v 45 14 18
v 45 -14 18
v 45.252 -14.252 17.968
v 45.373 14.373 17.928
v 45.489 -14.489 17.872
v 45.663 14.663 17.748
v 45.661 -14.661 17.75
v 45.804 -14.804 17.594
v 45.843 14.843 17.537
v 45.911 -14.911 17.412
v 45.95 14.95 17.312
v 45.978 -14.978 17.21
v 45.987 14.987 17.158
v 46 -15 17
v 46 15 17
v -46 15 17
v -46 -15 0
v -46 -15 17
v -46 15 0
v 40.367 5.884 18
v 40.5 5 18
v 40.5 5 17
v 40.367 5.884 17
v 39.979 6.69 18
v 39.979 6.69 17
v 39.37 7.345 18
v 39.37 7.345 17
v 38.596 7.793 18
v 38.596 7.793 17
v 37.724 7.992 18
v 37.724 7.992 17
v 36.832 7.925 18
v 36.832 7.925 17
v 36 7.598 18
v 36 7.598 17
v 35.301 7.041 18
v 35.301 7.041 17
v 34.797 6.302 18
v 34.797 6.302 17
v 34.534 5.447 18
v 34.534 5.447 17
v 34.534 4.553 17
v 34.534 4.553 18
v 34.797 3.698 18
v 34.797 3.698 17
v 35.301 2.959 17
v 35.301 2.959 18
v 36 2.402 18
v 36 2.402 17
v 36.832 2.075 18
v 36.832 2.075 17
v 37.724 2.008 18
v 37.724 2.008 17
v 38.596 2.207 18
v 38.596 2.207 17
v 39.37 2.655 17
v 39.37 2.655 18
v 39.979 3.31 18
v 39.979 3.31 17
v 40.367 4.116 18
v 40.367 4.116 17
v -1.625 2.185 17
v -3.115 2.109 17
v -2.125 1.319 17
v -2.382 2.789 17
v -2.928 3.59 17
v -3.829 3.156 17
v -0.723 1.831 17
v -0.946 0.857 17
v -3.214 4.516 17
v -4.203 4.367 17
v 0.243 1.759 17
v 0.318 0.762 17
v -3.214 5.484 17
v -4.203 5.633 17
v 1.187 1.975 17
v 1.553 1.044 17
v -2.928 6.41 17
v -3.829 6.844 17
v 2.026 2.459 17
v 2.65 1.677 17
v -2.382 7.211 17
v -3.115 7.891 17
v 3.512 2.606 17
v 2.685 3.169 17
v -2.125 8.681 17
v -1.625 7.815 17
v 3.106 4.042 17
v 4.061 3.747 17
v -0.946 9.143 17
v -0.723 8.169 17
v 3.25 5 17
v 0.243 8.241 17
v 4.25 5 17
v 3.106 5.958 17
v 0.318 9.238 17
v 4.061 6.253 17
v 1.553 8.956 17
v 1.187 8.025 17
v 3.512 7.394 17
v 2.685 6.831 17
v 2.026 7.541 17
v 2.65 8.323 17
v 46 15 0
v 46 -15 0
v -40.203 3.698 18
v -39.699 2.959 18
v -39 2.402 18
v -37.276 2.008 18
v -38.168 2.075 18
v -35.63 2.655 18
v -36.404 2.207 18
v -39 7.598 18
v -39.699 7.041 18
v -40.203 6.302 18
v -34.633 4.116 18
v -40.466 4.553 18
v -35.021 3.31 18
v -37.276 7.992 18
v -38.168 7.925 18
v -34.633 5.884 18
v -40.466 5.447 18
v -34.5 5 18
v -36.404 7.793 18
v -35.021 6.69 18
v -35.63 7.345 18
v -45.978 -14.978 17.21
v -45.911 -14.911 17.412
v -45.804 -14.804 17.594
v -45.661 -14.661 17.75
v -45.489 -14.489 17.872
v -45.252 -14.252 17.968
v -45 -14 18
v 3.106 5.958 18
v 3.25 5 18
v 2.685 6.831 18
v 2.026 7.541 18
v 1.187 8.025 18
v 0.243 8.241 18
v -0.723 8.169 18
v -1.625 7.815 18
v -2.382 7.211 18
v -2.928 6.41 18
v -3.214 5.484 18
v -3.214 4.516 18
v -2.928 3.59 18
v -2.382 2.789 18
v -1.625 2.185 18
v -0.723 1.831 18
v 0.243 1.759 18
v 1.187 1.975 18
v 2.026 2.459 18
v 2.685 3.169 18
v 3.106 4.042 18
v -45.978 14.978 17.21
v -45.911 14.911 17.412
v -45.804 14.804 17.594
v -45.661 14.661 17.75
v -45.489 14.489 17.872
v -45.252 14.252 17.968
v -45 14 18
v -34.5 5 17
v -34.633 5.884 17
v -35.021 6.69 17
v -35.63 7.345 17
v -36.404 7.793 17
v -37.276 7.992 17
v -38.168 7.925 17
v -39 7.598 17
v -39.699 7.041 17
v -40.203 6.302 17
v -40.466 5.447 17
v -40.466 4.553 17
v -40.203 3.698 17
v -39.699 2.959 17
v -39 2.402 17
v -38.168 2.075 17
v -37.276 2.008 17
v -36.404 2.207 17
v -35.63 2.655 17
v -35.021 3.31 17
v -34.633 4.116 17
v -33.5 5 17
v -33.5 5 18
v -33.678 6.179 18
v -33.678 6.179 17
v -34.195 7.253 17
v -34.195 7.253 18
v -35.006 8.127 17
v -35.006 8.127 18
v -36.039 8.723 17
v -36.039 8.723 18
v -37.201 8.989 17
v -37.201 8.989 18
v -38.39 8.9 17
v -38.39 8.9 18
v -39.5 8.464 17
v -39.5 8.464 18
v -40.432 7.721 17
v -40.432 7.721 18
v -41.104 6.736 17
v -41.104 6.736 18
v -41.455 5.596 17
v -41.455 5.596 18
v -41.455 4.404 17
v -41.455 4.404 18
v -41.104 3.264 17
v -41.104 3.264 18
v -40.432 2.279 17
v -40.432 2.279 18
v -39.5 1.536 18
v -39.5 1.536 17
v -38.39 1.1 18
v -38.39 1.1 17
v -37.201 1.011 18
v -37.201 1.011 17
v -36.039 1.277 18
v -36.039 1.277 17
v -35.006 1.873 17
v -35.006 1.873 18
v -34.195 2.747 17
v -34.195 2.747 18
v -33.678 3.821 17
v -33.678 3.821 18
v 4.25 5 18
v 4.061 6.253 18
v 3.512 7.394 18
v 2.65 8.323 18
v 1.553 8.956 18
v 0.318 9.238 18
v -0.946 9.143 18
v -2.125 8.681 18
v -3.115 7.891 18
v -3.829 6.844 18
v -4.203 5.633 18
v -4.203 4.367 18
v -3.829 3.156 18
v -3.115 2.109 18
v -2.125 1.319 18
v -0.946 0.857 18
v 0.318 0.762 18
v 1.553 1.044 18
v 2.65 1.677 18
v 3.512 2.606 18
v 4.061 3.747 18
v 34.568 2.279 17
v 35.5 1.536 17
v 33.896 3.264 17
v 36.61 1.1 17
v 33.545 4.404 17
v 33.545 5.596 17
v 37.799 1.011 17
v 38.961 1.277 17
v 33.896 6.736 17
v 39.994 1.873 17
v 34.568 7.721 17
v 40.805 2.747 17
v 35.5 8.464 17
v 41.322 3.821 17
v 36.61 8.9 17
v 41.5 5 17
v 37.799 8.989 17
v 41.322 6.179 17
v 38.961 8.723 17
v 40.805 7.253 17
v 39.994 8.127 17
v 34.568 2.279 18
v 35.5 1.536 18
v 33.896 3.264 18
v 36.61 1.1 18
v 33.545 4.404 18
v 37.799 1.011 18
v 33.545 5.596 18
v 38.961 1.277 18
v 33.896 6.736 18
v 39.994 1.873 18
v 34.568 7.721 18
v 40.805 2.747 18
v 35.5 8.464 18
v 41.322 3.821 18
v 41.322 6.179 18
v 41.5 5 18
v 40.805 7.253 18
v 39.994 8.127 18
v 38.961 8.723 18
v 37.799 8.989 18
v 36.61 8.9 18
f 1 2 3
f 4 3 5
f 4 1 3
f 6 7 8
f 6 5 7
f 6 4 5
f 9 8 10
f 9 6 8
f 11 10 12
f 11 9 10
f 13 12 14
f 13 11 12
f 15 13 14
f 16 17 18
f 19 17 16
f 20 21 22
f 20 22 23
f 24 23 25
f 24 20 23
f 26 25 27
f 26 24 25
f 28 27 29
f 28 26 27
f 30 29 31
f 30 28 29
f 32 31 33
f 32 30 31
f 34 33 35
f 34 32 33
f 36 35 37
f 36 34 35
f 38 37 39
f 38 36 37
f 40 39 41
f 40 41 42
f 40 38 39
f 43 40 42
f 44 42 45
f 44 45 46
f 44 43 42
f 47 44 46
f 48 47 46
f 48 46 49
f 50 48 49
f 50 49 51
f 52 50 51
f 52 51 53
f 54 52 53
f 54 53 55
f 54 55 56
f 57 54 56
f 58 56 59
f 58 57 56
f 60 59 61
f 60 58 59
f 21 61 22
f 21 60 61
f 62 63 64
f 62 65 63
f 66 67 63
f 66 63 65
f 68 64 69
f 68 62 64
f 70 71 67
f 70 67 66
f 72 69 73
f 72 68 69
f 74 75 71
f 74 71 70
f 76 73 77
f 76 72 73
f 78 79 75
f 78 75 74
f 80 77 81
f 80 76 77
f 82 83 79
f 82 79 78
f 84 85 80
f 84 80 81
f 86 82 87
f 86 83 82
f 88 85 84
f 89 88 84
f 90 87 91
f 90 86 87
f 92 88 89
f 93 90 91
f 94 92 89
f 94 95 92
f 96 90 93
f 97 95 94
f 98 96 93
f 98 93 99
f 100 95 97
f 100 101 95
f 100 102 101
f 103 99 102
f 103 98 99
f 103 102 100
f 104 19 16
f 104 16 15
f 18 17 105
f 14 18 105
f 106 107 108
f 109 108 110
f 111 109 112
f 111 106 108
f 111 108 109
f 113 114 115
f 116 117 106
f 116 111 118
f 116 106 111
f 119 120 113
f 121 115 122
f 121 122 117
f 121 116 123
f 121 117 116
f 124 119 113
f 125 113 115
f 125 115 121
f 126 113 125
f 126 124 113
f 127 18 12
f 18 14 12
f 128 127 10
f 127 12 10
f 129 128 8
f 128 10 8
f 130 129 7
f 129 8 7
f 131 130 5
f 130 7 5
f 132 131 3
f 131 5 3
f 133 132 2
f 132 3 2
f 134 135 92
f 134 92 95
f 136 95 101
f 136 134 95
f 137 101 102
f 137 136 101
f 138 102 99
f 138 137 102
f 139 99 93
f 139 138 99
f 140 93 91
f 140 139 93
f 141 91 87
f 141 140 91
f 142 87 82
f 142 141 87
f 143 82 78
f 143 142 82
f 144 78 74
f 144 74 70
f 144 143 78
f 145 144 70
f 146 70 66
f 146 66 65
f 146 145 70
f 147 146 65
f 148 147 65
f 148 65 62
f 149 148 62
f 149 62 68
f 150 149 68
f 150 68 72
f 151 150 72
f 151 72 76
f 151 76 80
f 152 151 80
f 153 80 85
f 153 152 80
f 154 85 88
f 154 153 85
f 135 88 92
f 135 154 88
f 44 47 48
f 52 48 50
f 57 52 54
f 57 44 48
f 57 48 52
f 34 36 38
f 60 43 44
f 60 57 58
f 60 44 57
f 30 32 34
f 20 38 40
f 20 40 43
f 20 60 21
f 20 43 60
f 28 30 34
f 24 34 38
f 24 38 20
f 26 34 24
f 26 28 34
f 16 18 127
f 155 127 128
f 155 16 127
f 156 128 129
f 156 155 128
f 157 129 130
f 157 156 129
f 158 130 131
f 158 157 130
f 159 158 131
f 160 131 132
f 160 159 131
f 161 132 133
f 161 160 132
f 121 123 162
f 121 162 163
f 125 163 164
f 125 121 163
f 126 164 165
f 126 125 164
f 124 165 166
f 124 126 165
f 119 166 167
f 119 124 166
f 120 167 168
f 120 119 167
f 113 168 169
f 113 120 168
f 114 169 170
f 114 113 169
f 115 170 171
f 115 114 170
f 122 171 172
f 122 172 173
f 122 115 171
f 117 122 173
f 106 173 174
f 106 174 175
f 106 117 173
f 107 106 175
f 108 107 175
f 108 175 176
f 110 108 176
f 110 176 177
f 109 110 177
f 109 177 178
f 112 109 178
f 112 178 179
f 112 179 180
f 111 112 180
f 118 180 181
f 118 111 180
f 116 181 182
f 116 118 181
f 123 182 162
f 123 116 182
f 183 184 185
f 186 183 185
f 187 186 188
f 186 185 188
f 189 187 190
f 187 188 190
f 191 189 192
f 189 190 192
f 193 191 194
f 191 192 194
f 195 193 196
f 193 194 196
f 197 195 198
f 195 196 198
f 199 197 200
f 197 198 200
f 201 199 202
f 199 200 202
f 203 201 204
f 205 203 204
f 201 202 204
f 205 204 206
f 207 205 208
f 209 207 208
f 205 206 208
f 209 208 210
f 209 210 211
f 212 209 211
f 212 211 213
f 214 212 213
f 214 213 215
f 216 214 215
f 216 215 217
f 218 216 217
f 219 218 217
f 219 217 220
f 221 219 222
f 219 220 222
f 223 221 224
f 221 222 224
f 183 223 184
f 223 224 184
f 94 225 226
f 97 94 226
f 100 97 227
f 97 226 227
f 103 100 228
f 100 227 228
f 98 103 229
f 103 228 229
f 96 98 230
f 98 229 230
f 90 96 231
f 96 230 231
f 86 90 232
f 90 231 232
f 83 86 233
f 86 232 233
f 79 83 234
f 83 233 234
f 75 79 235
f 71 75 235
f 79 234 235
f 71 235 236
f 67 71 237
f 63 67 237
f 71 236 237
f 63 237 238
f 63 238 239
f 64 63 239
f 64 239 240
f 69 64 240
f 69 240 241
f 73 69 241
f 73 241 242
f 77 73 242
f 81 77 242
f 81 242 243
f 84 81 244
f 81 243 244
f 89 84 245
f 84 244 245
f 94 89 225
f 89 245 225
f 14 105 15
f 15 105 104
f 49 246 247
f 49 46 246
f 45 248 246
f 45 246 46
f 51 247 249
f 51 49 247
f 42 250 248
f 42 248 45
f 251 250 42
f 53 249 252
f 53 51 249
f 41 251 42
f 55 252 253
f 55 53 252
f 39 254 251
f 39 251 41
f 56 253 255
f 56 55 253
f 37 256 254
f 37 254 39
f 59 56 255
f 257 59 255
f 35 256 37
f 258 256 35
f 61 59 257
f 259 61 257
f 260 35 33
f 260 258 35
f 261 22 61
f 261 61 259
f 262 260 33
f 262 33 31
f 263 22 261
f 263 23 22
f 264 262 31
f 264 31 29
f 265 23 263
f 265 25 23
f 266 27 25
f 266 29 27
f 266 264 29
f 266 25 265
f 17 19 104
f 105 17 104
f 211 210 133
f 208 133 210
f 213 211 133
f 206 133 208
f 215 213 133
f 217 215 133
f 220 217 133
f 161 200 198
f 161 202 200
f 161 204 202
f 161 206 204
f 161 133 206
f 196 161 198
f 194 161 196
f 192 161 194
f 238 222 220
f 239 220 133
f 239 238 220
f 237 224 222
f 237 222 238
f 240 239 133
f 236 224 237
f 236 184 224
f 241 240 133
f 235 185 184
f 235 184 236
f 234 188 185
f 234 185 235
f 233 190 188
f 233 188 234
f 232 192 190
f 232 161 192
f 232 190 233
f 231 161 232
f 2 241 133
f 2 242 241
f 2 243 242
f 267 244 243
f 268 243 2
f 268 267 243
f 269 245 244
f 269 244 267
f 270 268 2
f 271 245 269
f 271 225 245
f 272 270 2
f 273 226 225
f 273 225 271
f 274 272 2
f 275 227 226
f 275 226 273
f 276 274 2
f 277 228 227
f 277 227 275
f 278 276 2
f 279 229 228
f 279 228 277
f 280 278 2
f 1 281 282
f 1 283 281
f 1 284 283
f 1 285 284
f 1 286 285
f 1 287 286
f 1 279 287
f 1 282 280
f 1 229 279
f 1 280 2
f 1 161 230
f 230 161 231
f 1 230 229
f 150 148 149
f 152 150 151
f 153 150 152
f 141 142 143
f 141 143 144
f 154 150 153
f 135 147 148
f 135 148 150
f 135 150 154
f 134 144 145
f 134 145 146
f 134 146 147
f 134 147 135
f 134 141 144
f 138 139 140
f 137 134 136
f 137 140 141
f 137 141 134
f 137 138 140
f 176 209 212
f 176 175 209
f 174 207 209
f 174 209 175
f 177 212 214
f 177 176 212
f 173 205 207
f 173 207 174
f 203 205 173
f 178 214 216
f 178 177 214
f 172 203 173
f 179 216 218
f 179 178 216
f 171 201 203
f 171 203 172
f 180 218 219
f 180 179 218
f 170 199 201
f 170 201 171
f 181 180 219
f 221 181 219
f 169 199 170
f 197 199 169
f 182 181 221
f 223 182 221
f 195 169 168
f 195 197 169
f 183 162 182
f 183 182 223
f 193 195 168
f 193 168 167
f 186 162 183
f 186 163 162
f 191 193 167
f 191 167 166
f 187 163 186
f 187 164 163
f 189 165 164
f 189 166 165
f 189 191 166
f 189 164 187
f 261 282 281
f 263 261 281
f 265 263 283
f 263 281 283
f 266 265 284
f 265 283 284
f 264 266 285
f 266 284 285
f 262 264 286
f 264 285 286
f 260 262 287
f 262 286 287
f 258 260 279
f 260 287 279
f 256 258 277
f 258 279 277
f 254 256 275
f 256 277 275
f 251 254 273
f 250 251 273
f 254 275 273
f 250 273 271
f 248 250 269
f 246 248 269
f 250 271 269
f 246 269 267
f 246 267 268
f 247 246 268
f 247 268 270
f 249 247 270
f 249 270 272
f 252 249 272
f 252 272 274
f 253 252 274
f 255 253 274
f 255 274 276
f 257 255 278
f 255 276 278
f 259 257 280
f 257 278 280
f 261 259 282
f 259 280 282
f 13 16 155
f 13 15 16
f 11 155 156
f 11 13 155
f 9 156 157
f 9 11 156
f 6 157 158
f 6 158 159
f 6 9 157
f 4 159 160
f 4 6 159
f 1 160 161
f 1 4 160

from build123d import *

# Parameters (mm, degrees)
SKETCH1_W           = 92
SKETCH1_H           = 30
BOSS_EXTRUDE1_DEPTH = 18
SKETCH2_R           = 4
SKETCH2_R_2         = 3
SKETCH2_R_3         = 4.25
SKETCH2_R_4         = 3.25
CUT_EXTRUDE1_DEPTH  = 1
FILLET1_R           = 1


with BuildPart() as part:
    # Sketch1 → Boss-Extrude1 (new body)
    with BuildSketch(Plane.XY):
        Rectangle(SKETCH1_W, SKETCH1_H)
    extrude(amount=BOSS_EXTRUDE1_DEPTH)

    # Sketch2 → Cut-Extrude1 (cut)
    # profile 1 of 3: a face of its own
    with BuildSketch(Plane.XY.offset(18)):
        with Locations((-37.5, 5)):
            Circle(SKETCH2_R)
        with Locations((-37.5, 5)):
            Circle(SKETCH2_R_2, mode=Mode.SUBTRACT)
    # profile 2 of 3: a face of its own
    with BuildSketch(Plane.XY.offset(18)):
        with Locations((0, 5)):
            Circle(SKETCH2_R_3)
        with Locations((0, 5)):
            Circle(SKETCH2_R_4, mode=Mode.SUBTRACT)
    # profile 3 of 3: a face of its own
    with BuildSketch(Plane.XY.offset(18)):
        with Locations((37.5, 5)):
            Circle(SKETCH2_R)
        with Locations((37.5, 5)):
            Circle(SKETCH2_R_2, mode=Mode.SUBTRACT)
    extrude(amount=-CUT_EXTRUDE1_DEPTH, mode=Mode.SUBTRACT)

    # Fillet1
    fillet1_edges = [part.edges().sort_by_distance(p)[0] for p in [
        (-46, 0, 18),
        (0, -15, 18),
        (46, 0, 18),
        (0, 15, 18),
    ]]
    fillet(fillet1_edges, radius=FILLET1_R)


solid = part.part
